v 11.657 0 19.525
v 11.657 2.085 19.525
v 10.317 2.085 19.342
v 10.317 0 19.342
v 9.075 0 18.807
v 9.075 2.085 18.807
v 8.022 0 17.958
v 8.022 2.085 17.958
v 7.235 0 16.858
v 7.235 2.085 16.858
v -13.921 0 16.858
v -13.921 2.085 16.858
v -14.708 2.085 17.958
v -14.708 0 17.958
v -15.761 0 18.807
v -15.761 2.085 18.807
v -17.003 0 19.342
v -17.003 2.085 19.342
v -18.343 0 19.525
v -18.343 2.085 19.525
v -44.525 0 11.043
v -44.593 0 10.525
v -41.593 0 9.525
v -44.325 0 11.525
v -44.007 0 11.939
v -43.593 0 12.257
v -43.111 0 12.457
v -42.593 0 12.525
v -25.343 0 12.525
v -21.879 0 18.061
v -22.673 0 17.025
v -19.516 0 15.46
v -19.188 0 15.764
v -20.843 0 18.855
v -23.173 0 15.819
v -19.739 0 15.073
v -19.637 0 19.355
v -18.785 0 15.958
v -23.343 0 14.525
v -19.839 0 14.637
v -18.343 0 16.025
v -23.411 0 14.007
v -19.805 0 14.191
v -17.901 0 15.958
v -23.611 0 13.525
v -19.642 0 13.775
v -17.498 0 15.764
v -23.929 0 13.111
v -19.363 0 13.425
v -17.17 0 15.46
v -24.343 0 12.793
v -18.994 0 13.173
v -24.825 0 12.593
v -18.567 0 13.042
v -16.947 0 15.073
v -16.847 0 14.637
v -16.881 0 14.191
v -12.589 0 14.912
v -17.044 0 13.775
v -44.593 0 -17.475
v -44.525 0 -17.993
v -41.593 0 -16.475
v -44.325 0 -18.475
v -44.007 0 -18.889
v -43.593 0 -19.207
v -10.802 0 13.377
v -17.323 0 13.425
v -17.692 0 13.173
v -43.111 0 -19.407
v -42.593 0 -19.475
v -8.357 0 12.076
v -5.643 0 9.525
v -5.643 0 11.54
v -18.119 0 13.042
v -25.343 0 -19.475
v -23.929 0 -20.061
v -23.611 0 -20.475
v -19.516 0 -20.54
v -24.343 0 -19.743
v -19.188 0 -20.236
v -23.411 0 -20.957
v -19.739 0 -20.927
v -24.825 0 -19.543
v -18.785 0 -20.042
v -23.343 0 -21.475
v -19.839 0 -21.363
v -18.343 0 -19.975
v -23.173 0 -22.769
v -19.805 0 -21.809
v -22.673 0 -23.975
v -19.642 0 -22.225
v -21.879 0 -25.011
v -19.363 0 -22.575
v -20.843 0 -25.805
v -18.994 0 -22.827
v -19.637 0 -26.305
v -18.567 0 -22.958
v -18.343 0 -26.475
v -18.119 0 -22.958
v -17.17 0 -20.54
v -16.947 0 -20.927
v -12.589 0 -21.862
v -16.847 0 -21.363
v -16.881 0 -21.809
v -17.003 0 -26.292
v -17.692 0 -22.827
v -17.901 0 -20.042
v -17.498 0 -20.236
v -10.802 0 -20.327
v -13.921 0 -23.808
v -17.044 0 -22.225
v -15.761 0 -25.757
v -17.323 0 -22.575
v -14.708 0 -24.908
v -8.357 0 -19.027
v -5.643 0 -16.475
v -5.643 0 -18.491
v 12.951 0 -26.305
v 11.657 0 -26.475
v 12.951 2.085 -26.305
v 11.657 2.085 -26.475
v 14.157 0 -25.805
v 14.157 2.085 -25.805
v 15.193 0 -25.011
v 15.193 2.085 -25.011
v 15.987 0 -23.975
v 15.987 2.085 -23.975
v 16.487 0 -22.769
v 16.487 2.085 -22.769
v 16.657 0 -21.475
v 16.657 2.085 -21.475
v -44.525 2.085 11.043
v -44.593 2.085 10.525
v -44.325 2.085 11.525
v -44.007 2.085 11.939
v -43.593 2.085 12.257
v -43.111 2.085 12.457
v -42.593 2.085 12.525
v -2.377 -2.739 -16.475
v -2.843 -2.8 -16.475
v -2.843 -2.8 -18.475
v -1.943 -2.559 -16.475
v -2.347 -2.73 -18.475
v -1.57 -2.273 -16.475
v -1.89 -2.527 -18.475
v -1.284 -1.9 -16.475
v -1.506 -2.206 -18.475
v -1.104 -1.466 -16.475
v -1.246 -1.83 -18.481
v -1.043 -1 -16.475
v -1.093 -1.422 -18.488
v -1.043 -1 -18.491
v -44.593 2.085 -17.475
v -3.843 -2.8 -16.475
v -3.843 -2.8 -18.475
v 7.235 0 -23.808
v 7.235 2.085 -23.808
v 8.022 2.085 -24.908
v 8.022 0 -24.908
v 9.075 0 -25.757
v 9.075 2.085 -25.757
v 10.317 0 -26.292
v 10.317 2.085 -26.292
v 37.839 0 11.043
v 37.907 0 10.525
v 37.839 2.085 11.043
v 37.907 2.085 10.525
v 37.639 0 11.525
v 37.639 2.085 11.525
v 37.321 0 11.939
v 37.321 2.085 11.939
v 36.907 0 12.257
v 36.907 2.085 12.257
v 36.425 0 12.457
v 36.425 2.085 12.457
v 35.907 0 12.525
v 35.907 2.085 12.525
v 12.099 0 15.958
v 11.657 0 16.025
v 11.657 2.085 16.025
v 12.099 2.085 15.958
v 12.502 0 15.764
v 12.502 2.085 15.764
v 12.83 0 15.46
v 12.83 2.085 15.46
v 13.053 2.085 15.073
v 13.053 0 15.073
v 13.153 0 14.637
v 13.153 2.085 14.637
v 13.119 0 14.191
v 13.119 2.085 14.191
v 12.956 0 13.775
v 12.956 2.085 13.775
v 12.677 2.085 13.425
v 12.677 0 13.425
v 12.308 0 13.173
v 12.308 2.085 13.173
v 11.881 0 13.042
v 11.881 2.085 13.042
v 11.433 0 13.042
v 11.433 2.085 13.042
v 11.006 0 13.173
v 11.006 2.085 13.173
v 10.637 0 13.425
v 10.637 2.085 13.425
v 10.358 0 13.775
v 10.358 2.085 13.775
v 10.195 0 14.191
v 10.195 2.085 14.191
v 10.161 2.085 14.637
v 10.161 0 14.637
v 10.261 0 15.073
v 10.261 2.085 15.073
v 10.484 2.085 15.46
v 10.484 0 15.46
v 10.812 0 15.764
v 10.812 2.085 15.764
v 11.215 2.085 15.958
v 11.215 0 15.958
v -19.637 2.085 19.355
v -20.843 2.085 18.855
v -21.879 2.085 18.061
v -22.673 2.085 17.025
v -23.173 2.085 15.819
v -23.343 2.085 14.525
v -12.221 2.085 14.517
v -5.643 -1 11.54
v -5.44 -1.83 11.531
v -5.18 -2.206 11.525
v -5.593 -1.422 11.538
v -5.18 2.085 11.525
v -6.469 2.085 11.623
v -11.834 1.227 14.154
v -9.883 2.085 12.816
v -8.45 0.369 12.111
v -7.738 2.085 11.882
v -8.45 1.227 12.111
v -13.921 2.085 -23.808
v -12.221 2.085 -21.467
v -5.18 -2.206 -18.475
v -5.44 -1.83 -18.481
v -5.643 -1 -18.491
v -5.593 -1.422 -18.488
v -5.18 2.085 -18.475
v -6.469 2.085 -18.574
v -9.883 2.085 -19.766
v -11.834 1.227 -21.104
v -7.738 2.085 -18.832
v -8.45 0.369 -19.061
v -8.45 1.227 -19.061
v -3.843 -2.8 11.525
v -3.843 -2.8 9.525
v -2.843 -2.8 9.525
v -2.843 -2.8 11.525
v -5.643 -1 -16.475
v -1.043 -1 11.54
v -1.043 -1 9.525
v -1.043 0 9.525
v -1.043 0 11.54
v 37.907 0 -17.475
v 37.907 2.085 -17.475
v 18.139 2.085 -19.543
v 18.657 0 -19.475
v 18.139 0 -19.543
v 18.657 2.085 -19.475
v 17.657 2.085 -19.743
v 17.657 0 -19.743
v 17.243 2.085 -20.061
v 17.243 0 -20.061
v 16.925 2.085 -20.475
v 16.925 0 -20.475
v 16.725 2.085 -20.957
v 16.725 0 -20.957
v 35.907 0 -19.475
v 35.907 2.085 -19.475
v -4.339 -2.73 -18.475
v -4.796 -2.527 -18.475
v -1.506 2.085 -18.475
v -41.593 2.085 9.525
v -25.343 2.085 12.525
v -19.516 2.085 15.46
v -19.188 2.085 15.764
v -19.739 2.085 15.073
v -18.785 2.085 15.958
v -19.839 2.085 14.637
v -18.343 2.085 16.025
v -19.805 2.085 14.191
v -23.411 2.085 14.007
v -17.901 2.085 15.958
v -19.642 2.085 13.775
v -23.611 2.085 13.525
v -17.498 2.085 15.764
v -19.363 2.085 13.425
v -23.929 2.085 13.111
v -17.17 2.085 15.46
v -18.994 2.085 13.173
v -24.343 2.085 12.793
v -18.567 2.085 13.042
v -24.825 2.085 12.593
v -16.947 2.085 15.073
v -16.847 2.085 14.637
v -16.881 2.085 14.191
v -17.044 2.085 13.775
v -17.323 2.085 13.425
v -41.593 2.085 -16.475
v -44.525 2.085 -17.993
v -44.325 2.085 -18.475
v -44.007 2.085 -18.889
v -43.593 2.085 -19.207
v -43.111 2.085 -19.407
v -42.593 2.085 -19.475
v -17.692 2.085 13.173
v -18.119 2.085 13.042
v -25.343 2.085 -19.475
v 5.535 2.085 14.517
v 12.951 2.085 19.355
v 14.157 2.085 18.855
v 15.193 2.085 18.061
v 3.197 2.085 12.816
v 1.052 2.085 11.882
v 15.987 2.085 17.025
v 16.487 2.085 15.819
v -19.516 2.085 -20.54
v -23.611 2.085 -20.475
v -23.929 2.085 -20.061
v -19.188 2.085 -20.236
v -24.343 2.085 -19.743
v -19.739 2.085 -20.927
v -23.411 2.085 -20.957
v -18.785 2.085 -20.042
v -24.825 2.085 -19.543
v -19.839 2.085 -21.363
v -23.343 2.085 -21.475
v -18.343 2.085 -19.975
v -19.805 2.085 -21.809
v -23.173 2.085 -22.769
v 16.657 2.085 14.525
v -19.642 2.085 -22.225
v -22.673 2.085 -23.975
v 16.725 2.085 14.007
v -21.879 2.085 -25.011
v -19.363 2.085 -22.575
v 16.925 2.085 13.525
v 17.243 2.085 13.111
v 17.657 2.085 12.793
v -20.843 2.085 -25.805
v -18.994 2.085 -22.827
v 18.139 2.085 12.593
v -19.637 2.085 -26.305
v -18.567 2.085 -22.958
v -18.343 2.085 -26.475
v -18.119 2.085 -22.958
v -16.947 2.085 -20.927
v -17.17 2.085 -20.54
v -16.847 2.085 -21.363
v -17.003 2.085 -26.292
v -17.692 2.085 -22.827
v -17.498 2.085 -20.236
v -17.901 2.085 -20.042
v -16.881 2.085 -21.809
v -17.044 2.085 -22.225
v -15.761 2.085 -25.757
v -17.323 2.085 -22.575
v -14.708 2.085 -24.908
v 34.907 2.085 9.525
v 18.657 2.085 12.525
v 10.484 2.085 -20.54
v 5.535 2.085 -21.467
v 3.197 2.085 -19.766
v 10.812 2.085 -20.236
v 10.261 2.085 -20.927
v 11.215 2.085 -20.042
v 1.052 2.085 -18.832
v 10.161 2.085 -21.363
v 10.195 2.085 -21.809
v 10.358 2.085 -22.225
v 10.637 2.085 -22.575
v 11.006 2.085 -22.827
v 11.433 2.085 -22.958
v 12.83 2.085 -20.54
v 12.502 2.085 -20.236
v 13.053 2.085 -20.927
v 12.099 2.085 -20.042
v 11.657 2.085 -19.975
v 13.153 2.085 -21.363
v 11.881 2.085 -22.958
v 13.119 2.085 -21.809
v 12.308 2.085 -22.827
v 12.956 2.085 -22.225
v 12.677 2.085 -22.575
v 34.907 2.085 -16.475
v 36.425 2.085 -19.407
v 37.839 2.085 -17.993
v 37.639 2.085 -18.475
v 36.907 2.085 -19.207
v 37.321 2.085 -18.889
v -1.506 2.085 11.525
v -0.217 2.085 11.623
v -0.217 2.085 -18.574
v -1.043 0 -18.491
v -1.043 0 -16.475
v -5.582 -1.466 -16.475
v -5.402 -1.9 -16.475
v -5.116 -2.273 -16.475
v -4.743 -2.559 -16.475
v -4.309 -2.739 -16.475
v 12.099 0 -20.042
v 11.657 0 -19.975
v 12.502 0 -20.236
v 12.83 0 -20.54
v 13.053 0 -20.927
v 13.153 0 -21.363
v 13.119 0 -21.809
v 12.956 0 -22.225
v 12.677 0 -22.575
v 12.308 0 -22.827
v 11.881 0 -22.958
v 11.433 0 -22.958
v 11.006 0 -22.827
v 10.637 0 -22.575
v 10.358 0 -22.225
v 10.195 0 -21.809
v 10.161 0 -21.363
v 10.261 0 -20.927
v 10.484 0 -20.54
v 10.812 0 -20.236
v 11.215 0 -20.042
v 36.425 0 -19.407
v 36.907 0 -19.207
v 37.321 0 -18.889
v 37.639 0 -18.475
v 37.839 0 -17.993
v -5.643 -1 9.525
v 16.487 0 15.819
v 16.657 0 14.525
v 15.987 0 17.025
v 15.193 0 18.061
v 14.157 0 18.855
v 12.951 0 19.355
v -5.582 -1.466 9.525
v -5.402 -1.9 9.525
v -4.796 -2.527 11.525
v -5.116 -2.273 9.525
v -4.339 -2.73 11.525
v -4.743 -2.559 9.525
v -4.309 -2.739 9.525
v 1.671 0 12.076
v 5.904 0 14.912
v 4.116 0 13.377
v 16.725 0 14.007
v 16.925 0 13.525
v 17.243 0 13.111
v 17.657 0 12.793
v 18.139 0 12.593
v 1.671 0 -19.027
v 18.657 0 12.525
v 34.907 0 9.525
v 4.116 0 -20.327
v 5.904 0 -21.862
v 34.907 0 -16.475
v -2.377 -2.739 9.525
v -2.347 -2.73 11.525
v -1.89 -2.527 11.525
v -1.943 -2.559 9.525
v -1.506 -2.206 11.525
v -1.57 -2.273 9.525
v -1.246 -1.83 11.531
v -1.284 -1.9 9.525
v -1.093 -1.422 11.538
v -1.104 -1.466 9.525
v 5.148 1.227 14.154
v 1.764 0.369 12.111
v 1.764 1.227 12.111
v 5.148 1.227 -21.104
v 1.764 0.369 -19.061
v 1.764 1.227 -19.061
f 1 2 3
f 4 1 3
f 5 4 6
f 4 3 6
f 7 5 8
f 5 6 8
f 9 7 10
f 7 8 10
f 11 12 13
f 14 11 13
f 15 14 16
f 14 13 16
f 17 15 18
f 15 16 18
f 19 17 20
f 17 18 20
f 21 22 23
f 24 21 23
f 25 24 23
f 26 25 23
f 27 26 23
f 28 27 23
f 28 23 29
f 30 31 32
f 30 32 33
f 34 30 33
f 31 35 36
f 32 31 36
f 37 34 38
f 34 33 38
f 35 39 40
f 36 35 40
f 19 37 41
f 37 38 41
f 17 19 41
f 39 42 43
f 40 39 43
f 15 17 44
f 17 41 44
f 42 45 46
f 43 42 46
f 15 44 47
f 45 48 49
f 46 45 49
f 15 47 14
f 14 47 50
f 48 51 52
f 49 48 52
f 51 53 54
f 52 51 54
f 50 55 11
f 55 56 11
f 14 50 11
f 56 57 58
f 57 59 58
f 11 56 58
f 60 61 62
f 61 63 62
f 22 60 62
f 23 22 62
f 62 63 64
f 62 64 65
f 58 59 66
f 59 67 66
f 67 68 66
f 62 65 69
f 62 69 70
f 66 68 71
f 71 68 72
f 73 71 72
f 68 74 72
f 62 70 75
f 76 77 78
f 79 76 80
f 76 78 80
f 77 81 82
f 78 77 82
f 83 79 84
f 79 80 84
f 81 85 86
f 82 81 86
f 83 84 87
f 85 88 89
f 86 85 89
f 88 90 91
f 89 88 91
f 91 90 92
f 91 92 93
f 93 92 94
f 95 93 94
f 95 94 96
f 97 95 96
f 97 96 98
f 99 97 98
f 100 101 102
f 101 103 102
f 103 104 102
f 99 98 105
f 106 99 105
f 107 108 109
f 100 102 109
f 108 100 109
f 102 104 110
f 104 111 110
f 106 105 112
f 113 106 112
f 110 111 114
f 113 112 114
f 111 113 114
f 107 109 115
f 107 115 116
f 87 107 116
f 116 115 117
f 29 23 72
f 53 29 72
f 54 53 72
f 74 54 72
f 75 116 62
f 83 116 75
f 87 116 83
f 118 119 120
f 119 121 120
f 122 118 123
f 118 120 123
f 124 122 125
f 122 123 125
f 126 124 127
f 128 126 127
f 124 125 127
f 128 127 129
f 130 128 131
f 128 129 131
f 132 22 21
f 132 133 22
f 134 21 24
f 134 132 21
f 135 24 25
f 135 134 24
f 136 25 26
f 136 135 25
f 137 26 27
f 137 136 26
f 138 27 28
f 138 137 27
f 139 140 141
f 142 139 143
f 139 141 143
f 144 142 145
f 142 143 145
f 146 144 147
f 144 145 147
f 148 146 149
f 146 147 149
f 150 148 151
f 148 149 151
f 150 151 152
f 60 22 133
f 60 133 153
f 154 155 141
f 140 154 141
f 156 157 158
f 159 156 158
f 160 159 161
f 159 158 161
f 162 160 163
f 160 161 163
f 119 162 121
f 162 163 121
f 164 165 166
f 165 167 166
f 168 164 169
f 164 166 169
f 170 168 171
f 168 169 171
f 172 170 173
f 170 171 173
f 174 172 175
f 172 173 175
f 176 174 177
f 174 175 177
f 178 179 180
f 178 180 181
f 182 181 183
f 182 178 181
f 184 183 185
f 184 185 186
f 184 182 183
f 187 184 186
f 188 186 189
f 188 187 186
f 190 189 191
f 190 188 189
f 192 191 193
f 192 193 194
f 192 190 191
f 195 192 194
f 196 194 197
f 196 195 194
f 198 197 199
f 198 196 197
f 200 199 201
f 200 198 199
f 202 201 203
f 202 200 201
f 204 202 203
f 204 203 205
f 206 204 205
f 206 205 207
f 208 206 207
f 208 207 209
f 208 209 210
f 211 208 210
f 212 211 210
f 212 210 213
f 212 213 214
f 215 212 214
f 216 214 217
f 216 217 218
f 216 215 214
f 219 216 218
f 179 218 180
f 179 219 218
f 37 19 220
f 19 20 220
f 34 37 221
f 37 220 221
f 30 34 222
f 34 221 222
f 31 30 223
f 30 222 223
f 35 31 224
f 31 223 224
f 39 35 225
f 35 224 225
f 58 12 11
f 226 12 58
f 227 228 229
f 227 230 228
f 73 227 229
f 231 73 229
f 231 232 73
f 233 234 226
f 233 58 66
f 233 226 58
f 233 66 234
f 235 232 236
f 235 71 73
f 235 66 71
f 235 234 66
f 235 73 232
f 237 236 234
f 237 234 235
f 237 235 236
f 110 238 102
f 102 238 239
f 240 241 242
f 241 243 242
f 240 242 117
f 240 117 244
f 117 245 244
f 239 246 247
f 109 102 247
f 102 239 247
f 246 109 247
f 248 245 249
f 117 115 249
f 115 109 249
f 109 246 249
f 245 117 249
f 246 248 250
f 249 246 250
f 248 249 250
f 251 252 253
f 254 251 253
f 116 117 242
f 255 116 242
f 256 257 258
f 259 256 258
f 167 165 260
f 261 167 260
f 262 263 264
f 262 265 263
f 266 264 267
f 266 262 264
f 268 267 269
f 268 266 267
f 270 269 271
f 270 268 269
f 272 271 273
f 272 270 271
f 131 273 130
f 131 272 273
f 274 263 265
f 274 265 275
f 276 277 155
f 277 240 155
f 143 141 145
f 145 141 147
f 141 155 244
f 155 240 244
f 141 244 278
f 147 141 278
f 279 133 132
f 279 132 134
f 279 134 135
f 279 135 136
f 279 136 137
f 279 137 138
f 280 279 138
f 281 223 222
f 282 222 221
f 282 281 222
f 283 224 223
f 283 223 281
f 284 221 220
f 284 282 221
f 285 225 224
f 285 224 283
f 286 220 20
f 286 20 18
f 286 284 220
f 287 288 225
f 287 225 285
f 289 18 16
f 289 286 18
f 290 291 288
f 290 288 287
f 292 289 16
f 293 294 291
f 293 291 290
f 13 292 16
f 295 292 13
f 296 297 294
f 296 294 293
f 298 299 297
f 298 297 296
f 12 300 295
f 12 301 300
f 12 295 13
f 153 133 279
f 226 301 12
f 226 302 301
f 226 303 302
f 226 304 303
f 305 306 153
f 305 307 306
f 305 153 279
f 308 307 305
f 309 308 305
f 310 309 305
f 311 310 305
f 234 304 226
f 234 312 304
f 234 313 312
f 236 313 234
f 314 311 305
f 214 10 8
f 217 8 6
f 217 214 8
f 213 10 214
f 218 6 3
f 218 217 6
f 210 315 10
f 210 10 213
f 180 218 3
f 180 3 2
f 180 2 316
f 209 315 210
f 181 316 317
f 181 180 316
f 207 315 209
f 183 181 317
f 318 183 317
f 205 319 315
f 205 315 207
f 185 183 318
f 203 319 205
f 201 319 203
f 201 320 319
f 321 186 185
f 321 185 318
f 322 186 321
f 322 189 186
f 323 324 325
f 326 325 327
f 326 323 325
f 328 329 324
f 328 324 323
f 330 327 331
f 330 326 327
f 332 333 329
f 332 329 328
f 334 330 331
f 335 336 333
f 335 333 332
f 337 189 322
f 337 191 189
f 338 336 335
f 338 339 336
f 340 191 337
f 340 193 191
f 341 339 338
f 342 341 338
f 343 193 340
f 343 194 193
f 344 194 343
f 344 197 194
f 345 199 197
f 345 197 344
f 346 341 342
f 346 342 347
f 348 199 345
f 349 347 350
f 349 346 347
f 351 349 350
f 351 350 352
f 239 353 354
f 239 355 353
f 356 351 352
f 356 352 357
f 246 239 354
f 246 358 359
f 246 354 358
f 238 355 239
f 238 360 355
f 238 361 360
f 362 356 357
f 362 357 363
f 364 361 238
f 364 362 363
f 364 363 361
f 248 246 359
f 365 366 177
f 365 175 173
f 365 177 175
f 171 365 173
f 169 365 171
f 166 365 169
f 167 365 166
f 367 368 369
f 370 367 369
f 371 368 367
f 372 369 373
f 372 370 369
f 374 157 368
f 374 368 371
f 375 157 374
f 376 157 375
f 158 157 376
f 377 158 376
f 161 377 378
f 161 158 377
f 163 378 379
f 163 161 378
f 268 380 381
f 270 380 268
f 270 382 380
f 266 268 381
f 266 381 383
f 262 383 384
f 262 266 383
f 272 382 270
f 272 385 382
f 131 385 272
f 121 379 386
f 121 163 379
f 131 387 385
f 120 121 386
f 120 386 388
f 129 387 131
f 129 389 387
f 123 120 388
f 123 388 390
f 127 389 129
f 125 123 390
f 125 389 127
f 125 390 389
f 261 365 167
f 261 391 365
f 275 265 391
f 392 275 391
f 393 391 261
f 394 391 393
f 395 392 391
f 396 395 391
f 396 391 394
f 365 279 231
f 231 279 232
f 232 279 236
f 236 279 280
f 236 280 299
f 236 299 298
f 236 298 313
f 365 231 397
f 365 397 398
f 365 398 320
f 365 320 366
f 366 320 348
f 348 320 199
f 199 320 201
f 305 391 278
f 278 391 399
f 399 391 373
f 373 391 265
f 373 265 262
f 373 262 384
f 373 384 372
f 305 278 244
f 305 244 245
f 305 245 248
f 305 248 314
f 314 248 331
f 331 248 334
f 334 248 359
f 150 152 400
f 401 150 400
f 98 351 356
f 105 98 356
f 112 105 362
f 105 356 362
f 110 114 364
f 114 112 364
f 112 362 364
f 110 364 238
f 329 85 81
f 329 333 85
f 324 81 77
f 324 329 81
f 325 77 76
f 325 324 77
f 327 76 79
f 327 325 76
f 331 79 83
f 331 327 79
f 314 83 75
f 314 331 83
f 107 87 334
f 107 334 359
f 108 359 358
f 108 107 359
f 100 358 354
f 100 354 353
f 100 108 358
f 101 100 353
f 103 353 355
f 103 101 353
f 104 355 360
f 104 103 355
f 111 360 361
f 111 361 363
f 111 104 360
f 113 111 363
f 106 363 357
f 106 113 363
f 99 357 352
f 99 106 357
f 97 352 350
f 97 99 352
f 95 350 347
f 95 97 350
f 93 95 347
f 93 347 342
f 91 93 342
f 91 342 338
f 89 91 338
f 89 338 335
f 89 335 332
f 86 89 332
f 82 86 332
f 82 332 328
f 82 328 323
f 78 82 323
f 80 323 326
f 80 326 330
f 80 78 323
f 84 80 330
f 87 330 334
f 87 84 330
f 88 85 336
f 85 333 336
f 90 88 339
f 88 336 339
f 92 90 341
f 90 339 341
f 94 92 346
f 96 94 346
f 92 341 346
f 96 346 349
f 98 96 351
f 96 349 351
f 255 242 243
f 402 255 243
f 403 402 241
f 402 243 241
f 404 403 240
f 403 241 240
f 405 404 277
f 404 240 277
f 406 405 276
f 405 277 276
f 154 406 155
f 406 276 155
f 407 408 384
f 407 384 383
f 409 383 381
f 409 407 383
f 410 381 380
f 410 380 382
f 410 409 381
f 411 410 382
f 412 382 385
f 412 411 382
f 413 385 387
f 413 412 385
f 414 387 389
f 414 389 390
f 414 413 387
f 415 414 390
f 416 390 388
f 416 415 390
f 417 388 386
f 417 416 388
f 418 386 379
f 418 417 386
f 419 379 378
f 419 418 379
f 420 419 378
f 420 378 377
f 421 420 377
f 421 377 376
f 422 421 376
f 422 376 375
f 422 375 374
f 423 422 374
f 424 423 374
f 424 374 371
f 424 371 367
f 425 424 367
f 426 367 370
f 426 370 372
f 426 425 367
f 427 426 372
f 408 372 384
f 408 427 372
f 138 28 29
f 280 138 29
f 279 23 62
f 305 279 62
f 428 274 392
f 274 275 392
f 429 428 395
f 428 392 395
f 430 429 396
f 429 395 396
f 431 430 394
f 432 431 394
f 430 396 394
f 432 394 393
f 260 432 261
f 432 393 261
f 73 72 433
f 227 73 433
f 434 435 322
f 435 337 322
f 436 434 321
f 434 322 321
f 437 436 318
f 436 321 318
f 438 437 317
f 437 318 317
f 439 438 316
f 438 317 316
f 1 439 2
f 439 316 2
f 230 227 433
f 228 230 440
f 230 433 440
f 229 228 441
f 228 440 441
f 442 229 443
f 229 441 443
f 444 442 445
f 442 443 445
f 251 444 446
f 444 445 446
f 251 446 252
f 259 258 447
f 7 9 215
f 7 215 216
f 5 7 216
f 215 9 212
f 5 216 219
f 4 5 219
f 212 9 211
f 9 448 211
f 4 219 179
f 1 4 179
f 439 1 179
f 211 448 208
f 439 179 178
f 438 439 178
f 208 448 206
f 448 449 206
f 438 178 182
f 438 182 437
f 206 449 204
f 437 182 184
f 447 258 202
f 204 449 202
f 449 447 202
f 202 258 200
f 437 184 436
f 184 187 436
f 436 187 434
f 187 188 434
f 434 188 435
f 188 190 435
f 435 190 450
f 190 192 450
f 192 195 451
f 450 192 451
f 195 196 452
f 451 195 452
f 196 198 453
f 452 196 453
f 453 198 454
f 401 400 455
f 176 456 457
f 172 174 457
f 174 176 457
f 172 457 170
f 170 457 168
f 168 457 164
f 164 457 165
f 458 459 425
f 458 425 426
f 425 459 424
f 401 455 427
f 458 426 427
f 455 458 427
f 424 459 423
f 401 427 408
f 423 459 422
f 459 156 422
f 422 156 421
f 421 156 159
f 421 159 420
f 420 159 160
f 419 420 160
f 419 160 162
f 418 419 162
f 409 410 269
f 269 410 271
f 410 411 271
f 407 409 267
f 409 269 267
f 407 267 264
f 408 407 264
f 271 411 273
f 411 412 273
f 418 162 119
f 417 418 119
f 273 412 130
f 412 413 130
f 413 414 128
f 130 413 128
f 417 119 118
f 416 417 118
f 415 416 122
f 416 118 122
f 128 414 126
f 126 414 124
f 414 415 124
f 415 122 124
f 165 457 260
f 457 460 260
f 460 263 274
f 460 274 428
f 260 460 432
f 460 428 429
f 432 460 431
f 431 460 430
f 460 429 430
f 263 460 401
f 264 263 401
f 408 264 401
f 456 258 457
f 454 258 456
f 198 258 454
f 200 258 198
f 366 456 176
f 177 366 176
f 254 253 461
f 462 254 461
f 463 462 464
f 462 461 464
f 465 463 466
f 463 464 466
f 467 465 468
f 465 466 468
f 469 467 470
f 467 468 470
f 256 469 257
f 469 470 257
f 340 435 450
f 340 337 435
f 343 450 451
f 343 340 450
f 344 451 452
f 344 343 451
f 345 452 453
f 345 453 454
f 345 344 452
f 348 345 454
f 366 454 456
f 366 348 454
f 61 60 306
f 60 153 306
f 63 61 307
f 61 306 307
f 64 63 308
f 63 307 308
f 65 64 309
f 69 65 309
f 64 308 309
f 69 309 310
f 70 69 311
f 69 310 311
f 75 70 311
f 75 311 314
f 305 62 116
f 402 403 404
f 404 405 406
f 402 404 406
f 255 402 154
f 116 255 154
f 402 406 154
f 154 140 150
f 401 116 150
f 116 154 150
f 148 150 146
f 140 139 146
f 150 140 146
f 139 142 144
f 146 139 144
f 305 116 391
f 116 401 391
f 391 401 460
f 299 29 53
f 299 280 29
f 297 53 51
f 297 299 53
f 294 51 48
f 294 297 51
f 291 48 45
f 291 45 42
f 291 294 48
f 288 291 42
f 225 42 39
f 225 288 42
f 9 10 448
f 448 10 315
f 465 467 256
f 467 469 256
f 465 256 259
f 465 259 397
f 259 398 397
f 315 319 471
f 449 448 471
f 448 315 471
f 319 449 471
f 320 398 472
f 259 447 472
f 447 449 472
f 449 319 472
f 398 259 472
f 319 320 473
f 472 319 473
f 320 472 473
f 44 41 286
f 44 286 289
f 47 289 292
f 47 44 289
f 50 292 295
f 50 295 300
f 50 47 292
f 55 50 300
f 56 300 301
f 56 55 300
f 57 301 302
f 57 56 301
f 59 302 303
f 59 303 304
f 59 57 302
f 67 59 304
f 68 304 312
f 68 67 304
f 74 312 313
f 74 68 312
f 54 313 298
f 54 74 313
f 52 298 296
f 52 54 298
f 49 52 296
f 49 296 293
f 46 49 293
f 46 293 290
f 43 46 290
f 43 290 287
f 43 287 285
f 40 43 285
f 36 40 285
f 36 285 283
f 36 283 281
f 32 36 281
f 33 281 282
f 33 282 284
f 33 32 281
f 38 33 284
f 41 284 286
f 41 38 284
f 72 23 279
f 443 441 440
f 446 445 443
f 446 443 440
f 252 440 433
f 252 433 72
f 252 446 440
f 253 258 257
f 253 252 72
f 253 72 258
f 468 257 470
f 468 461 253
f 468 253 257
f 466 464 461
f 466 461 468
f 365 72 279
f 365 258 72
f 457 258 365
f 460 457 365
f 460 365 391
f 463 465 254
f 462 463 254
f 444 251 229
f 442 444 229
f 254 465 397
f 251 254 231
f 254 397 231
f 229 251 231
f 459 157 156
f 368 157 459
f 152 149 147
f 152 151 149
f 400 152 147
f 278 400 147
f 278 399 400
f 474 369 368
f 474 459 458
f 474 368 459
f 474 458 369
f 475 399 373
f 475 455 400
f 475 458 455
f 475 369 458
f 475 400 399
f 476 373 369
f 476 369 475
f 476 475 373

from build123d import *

# Parameters (mm, degrees)
SKETCH1_W           = 40
SKETCH1_H           = 7
SKETCH1_R           = 1.5
SKETCH1_W_2         = 82.5
SKETCH1_H_2         = 32
SKETCH1_W_3         = 76.5
SKETCH1_H_3         = 26
BOSS_EXTRUDE1_DEPTH = 2.085
SKETCH2_W           = 5
SKETCH2_H           = 10
BOSS_EXTRUDE2_DEPTH = 3
FILLET1_R           = 2
FILLET2_R           = 2
CUT_EXTRUDE1_DEPTH  = 65.136818612
SKETCH4_W           = 30
SKETCH4_H           = 6.817038716
CUT_EXTRUDE2_DEPTH  = 53.089568977
FILLET3_R           = 5
FILLET4_R           = 2


with BuildPart() as part:
    # Sketch1 → Boss-Extrude1 (new body)
    # profile 1 of 3: a face of its own
    with BuildSketch(Plane(origin=(0, 0, 0), x_dir=(1, 0, 0), z_dir=(0, 1, 0))):
        with Locations((-3.342953498, -16.024946279)):
            Rectangle(SKETCH1_W, SKETCH1_H)
        with Locations(Location((-18.342953498, -14.524946279, 0), (0, 0, 270))):
            Circle(SKETCH1_R, mode=Mode.SUBTRACT)
        with Locations(Location((11.657046502, -14.524946279, 0), (0, 0, 270))):
            Circle(SKETCH1_R, mode=Mode.SUBTRACT)
    # profile 2 of 3: a face of its own
    with BuildSketch(Plane(origin=(0, 0, 0), x_dir=(1, 0, 0), z_dir=(0, 1, 0))):
        with Locations((-3.342953498, 3.475053721)):
            Rectangle(SKETCH1_W_2, SKETCH1_H_2)
        with Locations((-3.342953498, 3.475053721)):
            Rectangle(SKETCH1_W_3, SKETCH1_H_3, mode=Mode.SUBTRACT)
    # profile 3 of 3: a face of its own
    with BuildSketch(Plane(origin=(0, 0, 0), x_dir=(1, 0, 0), z_dir=(0, 1, 0))):
        with Locations((-3.342953498, 22.975053721)):
            Rectangle(SKETCH1_W, SKETCH1_H)
        with Locations(Location((-18.342953498, 21.475053721, 0), (0, 0, 270))):
            Circle(SKETCH1_R, mode=Mode.SUBTRACT)
        with Locations(Location((11.657046502, 21.475053721, 0), (0, 0, 270))):
            Circle(SKETCH1_R, mode=Mode.SUBTRACT)
    extrude(amount=BOSS_EXTRUDE1_DEPTH)

    # Sketch2 → Boss-Extrude2 (add)
    with BuildSketch(Plane.XZ):
        with Locations((-3.342953498, 14.524946279)):
            Rectangle(SKETCH2_W, SKETCH2_H)
        with Locations((-3.342953498, -21.475053721)):
            Rectangle(SKETCH2_W, SKETCH2_H)
    extrude(amount=BOSS_EXTRUDE2_DEPTH)

    # Fillet1
    fillet1_edges = [part.edges().sort_by_distance(p)[0] for p in [
        (-5.842953498, -3, 14.524946279),
        (-0.842953498, -3, 14.524946279),
        (-0.842953498, -3, -21.475053721),
        (-5.842953498, -3, -21.475053721),
    ]]
    fillet(fillet1_edges, radius=FILLET1_R)

    # Fillet2
    fillet2_edges = [part.edges().sort_by_distance(p)[0] for p in [
        (-44.592953498, 1.0425, 12.524946279),
        (-44.592953498, 1.0425, -19.475053721),
        (37.907046502, 1.0425, -19.475053721),
        (37.907046502, 1.0425, 12.524946279),
    ]]
    fillet(fillet2_edges, radius=FILLET2_R)

    # Sketch3 → Cut-Extrude1 (cut, through all)
    with BuildSketch(Plane(origin=(0, 0, -26.475053721), x_dir=(-1, 0, 0), z_dir=(0, 0, -1))):
        with BuildLine():
            Line((5.842953498, -1), (5.842953498, 0))
            Line((5.842953498, 0), (5.642953498, 0))
            Line((5.642953498, 0), (5.642953498, -1))
            ThreePointArc((5.642953498, -1), (5.115745704, -2.272792206), (3.842953498, -2.8))
            Line((3.842953498, -2.8), (2.842953498, -2.8))
            ThreePointArc((2.842953498, -2.8), (1.570161291, -2.272792206), (1.042953498, -1))
            Line((1.042953498, -1), (1.042953498, 0))
            Line((1.042953498, 0), (0.842953498, 0))
            Line((0.842953498, 0), (0.842953498, -1))
            ThreePointArc((0.842953498, -1), (1.428739935, -2.414213562), (2.842953498, -3))
            Line((2.842953498, -3), (3.842953498, -3))
            ThreePointArc((3.842953498, -3), (5.25716706, -2.414213562), (5.842953498, -1))
        make_face()
    extrude(amount=-CUT_EXTRUDE1_DEPTH, mode=Mode.SUBTRACT)

    # Sketch4 → Cut-Extrude2 (cut, through all)
    with BuildSketch(Plane(origin=(0, 2.085, 0), x_dir=(1, 0, 0), z_dir=(0, 1, 0))):
        with BuildLine():
            Line((-5.025587433, 18.475053721), (-3.342953498, 18.475053721))
            Line((-3.342953498, 18.475053721), (-1.660319563, 18.475053721))
            Line((-1.660319563, 18.475053721), (-1.5063675, 18.475053721))
            add(Edge.make_bspline(
                [(7.234880115, 23.808387054), (6.697838422, 22.80689338), (5.54618786, 21.222701251), (3.456402004, 19.887657692), (1.890908212, 19.048171258), (0.265447838, 18.611656881), (-0.841891354, 18.480685845), (-1.5063675, 18.475053721)],
                knots=[0, 0, 0, 0, 0.31493804, 0.524439854, 0.679221784, 0.802825172, 0.985869019, 0.985869019, 0.985869019, 0.985869019], degree=3))
            ThreePointArc((7.234880115, 23.808387054), (9.075057605, 25.756797914), (11.657046502, 26.475053721))
            Line((11.657046502, 26.475053721), (-18.342953498, 26.475053721))
            ThreePointArc((-18.342953498, 26.475053721), (-15.7609646, 25.756797914), (-13.92078711, 23.808387054))
            add(Edge.make_bspline(
                [(-13.92078711, 23.808387054), (-13.383745417, 22.80689338), (-12.232094855, 21.222701251), (-10.142308999, 19.887657692), (-8.576815207, 19.048171258), (-6.951354833, 18.611656881), (-5.844015641, 18.480685845), (-5.179539495, 18.475053721)],
                knots=[0, 0, 0, 0, 0.31493804, 0.524439854, 0.679221784, 0.802825172, 0.985869019, 0.985869019, 0.985869019, 0.985869019], degree=3))
            Line((-5.179539495, 18.475053721), (-5.025587433, 18.475053721))
        make_face()
        with Locations((-3.342953498, 29.883573079)):
            Rectangle(SKETCH4_W, SKETCH4_H)
        with BuildLine():
            ThreePointArc((-13.92078711, -16.858279612), (-15.7609646, -18.806690472), (-18.342953498, -19.524946279))
            Line((-18.342953498, -19.524946279), (11.657046502, -19.524946279))
            ThreePointArc((11.657046502, -19.524946279), (9.075057605, -18.806690472), (7.234880115, -16.858279612))
            add(Edge.make_bspline(
                [(7.234880115, -16.858279612), (6.697838422, -15.856785937), (5.54618786, -14.272593809), (3.456402004, -12.937550249), (1.890908212, -12.098063816), (0.265447838, -11.661549439), (-0.841891354, -11.530578403), (-1.5063675, -11.524946279)],
                knots=[0, 0, 0, 0, 0.31493804, 0.524439854, 0.679221784, 0.802825172, 0.985869019, 0.985869019, 0.985869019, 0.985869019], degree=3))
            Line((-1.5063675, -11.524946279), (-1.660319563, -11.524946279))
            Line((-1.660319563, -11.524946279), (-3.342953498, -11.524946279))
            Line((-3.342953498, -11.524946279), (-5.025587433, -11.524946279))
            Line((-5.025587433, -11.524946279), (-5.179539495, -11.524946279))
            add(Edge.make_bspline(
                [(-13.92078711, -16.858279612), (-13.383745417, -15.856785937), (-12.232094855, -14.272593809), (-10.142308999, -12.937550249), (-8.576815207, -12.098063816), (-6.951354833, -11.661549439), (-5.844015641, -11.530578403), (-5.179539495, -11.524946279)],
                knots=[0, 0, 0, 0, 0.31493804, 0.524439854, 0.679221784, 0.802825172, 0.985869019, 0.985869019, 0.985869019, 0.985869019], degree=3))
        make_face()
        with Locations((-3.342953498, -22.933465637)):
            Rectangle(SKETCH4_W, SKETCH4_H)
    extrude(amount=-CUT_EXTRUDE2_DEPTH, mode=Mode.SUBTRACT)

    # Fillet3
    fillet3_edges = [part.edges().sort_by_distance(p)[0] for p in [
        (16.657046502, 1.0425, -26.475053721),
        (-23.342953498, 1.0425, -26.475053721),
        (-23.342953498, 1.0425, 19.524946279),
        (16.657046502, 1.0425, 19.524946279),
    ]]
    fillet(fillet3_edges, radius=FILLET3_R - 0.0001)  # a hair under: the kernel refuses the full size

    # Fillet4
    fillet4_edges = [part.edges().sort_by_distance(p)[0] for p in [
        (16.657046502, 1.0425, 12.524946279),
        (-23.342953498, 1.0425, 12.524946279),
        (-23.342953498, 1.0425, -19.475053721),
        (16.657046502, 1.0425, -19.475053721),
    ]]
    fillet(fillet4_edges, radius=FILLET4_R)


solid = part.part
